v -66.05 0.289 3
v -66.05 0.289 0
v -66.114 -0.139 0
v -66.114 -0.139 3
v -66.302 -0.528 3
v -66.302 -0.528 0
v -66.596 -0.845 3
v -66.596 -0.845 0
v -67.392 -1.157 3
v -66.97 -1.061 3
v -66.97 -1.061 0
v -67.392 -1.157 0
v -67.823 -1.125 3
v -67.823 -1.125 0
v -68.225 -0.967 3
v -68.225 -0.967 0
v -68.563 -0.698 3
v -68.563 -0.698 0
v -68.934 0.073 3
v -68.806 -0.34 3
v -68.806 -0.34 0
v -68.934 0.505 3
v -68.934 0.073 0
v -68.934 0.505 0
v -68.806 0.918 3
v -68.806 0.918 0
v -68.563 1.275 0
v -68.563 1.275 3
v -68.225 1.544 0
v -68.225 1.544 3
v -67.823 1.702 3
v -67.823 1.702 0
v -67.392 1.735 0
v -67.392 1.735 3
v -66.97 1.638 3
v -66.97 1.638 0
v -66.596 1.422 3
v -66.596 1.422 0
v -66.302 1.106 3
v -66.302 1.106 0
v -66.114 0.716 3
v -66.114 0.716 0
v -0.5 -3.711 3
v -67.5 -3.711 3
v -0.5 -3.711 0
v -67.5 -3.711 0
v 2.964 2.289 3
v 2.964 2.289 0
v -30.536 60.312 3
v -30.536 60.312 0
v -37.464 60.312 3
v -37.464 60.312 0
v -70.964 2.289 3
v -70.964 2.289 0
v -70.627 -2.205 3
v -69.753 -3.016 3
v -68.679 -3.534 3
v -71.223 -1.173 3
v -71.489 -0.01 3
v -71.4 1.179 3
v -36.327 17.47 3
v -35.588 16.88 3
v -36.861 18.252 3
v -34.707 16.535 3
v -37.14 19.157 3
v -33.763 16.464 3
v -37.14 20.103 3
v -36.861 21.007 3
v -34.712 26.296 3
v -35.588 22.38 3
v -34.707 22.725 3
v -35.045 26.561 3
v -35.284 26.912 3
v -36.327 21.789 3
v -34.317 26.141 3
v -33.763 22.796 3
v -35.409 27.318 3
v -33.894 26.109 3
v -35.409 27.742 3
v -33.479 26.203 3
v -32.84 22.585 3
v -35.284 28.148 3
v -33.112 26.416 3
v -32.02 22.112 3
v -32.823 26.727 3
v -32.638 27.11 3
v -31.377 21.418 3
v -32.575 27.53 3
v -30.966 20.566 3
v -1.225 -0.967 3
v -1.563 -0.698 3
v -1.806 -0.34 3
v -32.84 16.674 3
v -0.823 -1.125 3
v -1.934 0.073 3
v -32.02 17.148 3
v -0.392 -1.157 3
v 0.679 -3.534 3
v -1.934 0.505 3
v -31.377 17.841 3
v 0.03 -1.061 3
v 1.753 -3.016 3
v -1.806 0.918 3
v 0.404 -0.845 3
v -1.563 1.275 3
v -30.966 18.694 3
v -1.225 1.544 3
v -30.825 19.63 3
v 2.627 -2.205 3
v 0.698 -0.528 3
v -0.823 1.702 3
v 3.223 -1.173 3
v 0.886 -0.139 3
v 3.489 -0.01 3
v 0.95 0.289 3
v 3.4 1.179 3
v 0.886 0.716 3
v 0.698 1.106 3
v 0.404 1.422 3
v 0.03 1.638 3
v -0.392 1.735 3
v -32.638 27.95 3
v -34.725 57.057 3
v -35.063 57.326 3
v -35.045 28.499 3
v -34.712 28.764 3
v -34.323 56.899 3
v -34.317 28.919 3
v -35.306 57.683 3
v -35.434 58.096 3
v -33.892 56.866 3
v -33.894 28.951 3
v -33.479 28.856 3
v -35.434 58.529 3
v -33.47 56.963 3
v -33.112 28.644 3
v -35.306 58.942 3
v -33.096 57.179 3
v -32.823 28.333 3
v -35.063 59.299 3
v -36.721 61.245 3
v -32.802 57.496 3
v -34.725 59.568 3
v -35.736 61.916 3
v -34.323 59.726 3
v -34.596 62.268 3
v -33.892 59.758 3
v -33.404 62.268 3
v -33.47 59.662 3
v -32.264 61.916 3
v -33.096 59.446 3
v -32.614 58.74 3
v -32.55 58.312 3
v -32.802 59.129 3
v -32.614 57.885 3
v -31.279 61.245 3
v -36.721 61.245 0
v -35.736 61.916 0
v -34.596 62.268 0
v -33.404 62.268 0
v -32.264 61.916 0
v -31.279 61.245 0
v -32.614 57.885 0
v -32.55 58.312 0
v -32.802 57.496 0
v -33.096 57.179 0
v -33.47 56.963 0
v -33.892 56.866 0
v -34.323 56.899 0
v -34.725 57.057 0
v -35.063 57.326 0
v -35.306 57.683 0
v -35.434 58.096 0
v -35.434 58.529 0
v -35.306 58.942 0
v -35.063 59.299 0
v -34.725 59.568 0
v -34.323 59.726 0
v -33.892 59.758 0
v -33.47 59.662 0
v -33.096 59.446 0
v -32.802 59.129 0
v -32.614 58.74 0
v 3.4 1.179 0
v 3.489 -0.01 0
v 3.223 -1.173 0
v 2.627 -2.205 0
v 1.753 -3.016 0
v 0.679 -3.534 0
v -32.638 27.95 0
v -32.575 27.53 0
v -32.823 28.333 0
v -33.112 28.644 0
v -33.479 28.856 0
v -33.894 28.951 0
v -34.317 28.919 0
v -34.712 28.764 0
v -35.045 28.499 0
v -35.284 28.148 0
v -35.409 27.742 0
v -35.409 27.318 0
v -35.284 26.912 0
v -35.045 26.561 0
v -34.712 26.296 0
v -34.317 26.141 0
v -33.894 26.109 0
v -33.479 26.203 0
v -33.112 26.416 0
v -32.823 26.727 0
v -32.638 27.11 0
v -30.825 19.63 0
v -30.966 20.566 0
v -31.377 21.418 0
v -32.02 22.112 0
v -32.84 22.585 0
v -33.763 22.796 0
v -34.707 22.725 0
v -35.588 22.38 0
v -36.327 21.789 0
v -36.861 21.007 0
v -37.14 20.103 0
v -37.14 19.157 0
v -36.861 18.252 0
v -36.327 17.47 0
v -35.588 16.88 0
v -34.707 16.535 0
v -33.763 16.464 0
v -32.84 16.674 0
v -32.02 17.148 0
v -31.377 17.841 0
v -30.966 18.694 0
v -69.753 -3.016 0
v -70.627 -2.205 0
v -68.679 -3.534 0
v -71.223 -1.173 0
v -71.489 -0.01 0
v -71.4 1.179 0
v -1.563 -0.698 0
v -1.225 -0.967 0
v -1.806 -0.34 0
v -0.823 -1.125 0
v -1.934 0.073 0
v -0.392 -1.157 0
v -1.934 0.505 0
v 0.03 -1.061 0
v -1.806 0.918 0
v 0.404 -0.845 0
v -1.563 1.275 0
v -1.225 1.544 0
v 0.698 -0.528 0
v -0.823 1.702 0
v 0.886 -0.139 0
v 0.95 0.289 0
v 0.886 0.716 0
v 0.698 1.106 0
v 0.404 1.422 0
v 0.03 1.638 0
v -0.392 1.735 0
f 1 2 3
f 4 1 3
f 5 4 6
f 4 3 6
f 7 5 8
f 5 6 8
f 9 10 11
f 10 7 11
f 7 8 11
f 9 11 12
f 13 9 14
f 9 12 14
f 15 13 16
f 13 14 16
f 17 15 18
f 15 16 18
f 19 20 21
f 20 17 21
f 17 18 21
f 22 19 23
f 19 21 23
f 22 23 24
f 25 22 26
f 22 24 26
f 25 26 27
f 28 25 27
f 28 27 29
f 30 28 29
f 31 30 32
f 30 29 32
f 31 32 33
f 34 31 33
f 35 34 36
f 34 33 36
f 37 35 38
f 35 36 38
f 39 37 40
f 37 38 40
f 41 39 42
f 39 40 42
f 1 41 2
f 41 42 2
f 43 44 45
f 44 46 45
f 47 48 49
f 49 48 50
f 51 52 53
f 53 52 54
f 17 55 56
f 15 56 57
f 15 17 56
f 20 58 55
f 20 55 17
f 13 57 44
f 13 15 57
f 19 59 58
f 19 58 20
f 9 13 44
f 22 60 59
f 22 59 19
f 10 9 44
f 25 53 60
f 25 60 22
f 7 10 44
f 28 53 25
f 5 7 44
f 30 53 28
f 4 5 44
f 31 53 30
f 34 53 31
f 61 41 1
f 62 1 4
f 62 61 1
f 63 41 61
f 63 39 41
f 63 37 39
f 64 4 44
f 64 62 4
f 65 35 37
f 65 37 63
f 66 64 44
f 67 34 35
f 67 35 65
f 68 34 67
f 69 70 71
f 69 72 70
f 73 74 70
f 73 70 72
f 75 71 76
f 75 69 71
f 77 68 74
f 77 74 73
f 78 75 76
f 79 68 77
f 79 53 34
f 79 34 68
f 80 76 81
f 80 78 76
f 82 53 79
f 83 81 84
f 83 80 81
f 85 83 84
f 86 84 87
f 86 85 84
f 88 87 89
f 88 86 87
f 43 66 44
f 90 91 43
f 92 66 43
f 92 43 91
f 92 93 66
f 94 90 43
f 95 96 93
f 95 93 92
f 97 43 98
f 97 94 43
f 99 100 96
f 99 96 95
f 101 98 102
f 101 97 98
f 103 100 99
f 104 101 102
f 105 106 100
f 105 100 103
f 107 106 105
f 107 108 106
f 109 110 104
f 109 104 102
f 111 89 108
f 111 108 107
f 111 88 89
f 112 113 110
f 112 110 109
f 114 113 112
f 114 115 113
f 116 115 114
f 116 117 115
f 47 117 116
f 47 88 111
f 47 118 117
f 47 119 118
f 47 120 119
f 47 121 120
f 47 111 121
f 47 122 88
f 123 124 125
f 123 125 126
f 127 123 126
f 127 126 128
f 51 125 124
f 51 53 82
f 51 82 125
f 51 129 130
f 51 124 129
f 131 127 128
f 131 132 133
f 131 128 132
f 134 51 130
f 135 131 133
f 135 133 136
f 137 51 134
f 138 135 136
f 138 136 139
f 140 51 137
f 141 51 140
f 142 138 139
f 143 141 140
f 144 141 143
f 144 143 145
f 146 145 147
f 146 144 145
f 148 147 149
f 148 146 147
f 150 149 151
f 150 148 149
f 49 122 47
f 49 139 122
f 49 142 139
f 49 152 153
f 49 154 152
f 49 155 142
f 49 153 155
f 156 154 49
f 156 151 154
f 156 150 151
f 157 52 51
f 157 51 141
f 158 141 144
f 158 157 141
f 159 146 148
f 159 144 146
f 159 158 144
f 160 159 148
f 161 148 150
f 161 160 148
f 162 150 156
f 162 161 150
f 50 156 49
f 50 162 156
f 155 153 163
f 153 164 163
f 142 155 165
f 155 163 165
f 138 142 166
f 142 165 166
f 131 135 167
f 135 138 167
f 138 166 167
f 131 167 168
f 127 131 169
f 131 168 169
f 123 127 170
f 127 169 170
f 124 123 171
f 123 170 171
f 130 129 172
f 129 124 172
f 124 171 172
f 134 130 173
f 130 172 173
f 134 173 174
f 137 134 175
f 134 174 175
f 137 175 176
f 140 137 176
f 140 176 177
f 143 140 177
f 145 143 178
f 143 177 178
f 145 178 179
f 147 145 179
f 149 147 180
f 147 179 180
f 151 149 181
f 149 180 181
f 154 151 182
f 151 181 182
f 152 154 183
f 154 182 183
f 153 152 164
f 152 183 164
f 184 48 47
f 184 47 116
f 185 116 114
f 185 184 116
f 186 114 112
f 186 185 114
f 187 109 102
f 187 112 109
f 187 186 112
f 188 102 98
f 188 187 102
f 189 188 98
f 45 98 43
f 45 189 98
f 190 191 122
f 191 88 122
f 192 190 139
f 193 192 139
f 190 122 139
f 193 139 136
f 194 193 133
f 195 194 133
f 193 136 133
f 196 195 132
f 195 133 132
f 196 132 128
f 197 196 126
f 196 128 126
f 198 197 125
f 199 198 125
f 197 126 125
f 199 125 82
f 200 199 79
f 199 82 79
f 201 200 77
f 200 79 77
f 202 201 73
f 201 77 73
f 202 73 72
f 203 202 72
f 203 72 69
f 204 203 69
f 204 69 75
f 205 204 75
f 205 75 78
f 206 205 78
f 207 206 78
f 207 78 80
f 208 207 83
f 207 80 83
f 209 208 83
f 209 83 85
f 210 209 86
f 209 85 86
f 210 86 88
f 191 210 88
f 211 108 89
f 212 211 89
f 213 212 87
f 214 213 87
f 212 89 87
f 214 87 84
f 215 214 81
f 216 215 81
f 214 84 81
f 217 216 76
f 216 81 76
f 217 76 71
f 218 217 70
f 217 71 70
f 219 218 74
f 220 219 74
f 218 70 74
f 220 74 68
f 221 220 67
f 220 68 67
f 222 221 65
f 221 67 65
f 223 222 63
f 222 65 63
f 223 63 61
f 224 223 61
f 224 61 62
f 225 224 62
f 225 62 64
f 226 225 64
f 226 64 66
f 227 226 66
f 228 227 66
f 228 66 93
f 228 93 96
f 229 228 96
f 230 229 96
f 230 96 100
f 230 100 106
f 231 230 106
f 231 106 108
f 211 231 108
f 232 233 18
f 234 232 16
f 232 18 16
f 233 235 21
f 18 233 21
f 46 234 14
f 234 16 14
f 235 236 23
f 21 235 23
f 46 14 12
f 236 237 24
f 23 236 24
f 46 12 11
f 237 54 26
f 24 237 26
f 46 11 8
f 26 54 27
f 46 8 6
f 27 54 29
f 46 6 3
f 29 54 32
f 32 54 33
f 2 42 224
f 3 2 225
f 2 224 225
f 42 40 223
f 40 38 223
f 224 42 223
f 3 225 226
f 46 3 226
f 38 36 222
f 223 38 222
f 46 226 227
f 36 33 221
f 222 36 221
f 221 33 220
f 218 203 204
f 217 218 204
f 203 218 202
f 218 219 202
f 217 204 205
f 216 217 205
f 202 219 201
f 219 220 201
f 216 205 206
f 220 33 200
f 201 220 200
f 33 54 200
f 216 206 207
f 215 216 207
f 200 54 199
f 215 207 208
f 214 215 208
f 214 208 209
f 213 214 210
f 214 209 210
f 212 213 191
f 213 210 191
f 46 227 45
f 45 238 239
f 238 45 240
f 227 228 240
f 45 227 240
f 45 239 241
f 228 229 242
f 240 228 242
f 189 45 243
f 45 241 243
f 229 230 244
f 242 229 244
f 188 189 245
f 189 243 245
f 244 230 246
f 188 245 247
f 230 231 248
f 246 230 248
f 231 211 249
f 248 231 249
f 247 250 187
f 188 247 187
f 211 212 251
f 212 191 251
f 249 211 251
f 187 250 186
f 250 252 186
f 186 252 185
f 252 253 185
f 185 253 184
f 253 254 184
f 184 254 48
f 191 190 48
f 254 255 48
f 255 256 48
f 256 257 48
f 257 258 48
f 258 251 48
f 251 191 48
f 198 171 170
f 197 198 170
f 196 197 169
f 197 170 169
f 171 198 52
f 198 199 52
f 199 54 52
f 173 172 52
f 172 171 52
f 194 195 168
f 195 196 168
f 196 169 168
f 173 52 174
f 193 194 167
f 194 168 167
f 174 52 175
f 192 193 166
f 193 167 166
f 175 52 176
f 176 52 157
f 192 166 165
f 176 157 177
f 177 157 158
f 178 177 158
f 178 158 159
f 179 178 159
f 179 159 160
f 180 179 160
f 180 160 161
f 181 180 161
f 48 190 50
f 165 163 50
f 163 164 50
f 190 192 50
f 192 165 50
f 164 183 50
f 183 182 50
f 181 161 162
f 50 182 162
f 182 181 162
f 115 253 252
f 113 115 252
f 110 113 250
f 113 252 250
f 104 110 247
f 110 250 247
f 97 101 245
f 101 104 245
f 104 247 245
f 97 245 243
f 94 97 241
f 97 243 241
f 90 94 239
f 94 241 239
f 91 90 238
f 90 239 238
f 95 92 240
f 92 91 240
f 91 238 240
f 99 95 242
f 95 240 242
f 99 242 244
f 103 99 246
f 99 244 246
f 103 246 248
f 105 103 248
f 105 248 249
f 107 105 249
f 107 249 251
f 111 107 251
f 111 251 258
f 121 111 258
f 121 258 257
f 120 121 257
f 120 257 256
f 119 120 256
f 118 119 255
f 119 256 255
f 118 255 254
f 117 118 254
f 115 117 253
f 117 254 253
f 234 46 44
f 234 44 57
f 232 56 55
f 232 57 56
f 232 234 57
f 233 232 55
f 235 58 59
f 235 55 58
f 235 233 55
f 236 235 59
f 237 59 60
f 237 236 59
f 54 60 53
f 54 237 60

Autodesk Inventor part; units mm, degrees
ref_plane "YZ Plane" through (0, 0, 0) normal (1, 0, 0) x (0, 1, 0)
ref_plane "XZ Plane" through (0, 0, 0) normal (0, 1, 0) x (-1, 0, 0)
ref_plane "XY Plane" through (0, 0, 0) normal (0, 0, 1) x (1, 0, 0)
ref_plane "Work Plane1" through (0, 0, 0) normal (0, 0, 1) x (1, 0, 0)
sketch "Sketch1" plane through (0, 0, 0) normal (0, 0, 1) x (1, 0, 0)
  circle A0 centre (-34, 58.3124) radius 1.425 projected
  circle A1 centre (-67.5, 0.2887) radius 1.425 projected
  circle A2 centre (-0.5, 0.2887) radius 1.425 projected
  arc A3 (-2.5, 3.7528) -> (-4.5, 0.2887) centre (-0.5, 0.2887) ccw projected
  arc A4 (-5, -0.2113) -> (-4.5, 0.2887) centre (-5, 0.2887) ccw projected
  line L0 (-5, -0.2113) -> (-63, -0.2113) projected
  arc A5 (-63.5, 0.2887) -> (-63, -0.2113) centre (-63, 0.2887) ccw projected
  arc A6 (-63.5, 0.2887) -> (-65.5, 3.7528) centre (-67.5, 0.2887) ccw projected
  arc A7 (-65.683, 4.4358) -> (-65.5, 3.7528) centre (-65.25, 4.1858) ccw projected
  line L1 (-65.683, 4.4358) -> (-36.683, 54.6653) projected
  arc A8 (-36, 54.8483) -> (-36.683, 54.6653) centre (-36.25, 54.4153) ccw projected
  arc A9 (-36, 54.8483) -> (-32, 54.8483) centre (-34, 58.3124) ccw projected
  arc A10 (-31.317, 54.6653) -> (-32, 54.8483) centre (-31.75, 54.4153) ccw projected
  line L2 (-31.317, 54.6653) -> (-2.317, 4.4358) projected
  arc A11 (-2.5, 3.7528) -> (-2.317, 4.4358) centre (-2.75, 4.1858) ccw projected
  line L3 (2.9641, 2.2887) -> (-30.5359, 60.3124) projected
  arc A12 (-30.5359, 60.3124) -> (-37.4641, 60.3124) centre (-34, 58.3124) ccw projected
  line L4 (-37.4641, 60.3124) -> (-70.9641, 2.2887) projected
  arc A13 (-70.9641, 2.2887) -> (-67.5, -3.7113) centre (-67.5, 0.2887) ccw projected
  line L5 (-67.5, -3.7113) -> (-0.5, -3.7113) projected
  arc A14 (-0.5, -3.7113) -> (2.9641, 2.2887) centre (-0.5, 0.2887) ccw projected
  circle A15 centre (-34, 58.3124) radius 1.45
  circle A16 centre (-0.5, 0.2887) radius 1.45
  circle A17 centre (-67.5, 0.2887) radius 1.45
  line L6 (-67.5, 0.2887) -> (-13.7859, 31.3005) construction
  line L7 (-0.5, 0.2887) -> (-54.2141, 31.3005) construction
  point P0 (0, 0)
  point P1 (-34, 19.6299)
  dimension "d0" = 2.9
extrude "Extrusion1" add sketch "Sketch1" along normal blind 3 contours A3 A4 L0 A5 A6 A7 L1 A8 A9 A10 L2 A11 | A14 L5 A13 L4 A12 L3
sketch "Sketch2" plane through (0, 0, 3) normal (0, 0, 1) x (1, 0, 0)
  line L0 (2.9641, 2.2887) -> (-30.5359, 60.3124) projected
  arc A0 (-30.5359, 60.3124) -> (-37.4641, 60.3124) centre (-34, 58.3124) ccw projected
  line L1 (-34, 58.3124) -> (-34, -3.7946) construction
  circle A1 centre (-34, 19.6299) radius 3.175
  circle A2 centre (-67.5, 0.2887) radius 1.45 projected
  line L2 (-67.5, 0.2887) -> (-13.7859, 31.3005) construction
  circle A3 centre (-34, 27.5299) radius 1.425
  dimension "d33" = 6.35
  dimension "d34" = 2.85
  dimension "d35" = 7.9
extrude "Extrusion4" cut sketch "Sketch2" against normal through all contours A1 | A3
properties part number "ServoHousingEndPlates" material "Wood (Birch)"
